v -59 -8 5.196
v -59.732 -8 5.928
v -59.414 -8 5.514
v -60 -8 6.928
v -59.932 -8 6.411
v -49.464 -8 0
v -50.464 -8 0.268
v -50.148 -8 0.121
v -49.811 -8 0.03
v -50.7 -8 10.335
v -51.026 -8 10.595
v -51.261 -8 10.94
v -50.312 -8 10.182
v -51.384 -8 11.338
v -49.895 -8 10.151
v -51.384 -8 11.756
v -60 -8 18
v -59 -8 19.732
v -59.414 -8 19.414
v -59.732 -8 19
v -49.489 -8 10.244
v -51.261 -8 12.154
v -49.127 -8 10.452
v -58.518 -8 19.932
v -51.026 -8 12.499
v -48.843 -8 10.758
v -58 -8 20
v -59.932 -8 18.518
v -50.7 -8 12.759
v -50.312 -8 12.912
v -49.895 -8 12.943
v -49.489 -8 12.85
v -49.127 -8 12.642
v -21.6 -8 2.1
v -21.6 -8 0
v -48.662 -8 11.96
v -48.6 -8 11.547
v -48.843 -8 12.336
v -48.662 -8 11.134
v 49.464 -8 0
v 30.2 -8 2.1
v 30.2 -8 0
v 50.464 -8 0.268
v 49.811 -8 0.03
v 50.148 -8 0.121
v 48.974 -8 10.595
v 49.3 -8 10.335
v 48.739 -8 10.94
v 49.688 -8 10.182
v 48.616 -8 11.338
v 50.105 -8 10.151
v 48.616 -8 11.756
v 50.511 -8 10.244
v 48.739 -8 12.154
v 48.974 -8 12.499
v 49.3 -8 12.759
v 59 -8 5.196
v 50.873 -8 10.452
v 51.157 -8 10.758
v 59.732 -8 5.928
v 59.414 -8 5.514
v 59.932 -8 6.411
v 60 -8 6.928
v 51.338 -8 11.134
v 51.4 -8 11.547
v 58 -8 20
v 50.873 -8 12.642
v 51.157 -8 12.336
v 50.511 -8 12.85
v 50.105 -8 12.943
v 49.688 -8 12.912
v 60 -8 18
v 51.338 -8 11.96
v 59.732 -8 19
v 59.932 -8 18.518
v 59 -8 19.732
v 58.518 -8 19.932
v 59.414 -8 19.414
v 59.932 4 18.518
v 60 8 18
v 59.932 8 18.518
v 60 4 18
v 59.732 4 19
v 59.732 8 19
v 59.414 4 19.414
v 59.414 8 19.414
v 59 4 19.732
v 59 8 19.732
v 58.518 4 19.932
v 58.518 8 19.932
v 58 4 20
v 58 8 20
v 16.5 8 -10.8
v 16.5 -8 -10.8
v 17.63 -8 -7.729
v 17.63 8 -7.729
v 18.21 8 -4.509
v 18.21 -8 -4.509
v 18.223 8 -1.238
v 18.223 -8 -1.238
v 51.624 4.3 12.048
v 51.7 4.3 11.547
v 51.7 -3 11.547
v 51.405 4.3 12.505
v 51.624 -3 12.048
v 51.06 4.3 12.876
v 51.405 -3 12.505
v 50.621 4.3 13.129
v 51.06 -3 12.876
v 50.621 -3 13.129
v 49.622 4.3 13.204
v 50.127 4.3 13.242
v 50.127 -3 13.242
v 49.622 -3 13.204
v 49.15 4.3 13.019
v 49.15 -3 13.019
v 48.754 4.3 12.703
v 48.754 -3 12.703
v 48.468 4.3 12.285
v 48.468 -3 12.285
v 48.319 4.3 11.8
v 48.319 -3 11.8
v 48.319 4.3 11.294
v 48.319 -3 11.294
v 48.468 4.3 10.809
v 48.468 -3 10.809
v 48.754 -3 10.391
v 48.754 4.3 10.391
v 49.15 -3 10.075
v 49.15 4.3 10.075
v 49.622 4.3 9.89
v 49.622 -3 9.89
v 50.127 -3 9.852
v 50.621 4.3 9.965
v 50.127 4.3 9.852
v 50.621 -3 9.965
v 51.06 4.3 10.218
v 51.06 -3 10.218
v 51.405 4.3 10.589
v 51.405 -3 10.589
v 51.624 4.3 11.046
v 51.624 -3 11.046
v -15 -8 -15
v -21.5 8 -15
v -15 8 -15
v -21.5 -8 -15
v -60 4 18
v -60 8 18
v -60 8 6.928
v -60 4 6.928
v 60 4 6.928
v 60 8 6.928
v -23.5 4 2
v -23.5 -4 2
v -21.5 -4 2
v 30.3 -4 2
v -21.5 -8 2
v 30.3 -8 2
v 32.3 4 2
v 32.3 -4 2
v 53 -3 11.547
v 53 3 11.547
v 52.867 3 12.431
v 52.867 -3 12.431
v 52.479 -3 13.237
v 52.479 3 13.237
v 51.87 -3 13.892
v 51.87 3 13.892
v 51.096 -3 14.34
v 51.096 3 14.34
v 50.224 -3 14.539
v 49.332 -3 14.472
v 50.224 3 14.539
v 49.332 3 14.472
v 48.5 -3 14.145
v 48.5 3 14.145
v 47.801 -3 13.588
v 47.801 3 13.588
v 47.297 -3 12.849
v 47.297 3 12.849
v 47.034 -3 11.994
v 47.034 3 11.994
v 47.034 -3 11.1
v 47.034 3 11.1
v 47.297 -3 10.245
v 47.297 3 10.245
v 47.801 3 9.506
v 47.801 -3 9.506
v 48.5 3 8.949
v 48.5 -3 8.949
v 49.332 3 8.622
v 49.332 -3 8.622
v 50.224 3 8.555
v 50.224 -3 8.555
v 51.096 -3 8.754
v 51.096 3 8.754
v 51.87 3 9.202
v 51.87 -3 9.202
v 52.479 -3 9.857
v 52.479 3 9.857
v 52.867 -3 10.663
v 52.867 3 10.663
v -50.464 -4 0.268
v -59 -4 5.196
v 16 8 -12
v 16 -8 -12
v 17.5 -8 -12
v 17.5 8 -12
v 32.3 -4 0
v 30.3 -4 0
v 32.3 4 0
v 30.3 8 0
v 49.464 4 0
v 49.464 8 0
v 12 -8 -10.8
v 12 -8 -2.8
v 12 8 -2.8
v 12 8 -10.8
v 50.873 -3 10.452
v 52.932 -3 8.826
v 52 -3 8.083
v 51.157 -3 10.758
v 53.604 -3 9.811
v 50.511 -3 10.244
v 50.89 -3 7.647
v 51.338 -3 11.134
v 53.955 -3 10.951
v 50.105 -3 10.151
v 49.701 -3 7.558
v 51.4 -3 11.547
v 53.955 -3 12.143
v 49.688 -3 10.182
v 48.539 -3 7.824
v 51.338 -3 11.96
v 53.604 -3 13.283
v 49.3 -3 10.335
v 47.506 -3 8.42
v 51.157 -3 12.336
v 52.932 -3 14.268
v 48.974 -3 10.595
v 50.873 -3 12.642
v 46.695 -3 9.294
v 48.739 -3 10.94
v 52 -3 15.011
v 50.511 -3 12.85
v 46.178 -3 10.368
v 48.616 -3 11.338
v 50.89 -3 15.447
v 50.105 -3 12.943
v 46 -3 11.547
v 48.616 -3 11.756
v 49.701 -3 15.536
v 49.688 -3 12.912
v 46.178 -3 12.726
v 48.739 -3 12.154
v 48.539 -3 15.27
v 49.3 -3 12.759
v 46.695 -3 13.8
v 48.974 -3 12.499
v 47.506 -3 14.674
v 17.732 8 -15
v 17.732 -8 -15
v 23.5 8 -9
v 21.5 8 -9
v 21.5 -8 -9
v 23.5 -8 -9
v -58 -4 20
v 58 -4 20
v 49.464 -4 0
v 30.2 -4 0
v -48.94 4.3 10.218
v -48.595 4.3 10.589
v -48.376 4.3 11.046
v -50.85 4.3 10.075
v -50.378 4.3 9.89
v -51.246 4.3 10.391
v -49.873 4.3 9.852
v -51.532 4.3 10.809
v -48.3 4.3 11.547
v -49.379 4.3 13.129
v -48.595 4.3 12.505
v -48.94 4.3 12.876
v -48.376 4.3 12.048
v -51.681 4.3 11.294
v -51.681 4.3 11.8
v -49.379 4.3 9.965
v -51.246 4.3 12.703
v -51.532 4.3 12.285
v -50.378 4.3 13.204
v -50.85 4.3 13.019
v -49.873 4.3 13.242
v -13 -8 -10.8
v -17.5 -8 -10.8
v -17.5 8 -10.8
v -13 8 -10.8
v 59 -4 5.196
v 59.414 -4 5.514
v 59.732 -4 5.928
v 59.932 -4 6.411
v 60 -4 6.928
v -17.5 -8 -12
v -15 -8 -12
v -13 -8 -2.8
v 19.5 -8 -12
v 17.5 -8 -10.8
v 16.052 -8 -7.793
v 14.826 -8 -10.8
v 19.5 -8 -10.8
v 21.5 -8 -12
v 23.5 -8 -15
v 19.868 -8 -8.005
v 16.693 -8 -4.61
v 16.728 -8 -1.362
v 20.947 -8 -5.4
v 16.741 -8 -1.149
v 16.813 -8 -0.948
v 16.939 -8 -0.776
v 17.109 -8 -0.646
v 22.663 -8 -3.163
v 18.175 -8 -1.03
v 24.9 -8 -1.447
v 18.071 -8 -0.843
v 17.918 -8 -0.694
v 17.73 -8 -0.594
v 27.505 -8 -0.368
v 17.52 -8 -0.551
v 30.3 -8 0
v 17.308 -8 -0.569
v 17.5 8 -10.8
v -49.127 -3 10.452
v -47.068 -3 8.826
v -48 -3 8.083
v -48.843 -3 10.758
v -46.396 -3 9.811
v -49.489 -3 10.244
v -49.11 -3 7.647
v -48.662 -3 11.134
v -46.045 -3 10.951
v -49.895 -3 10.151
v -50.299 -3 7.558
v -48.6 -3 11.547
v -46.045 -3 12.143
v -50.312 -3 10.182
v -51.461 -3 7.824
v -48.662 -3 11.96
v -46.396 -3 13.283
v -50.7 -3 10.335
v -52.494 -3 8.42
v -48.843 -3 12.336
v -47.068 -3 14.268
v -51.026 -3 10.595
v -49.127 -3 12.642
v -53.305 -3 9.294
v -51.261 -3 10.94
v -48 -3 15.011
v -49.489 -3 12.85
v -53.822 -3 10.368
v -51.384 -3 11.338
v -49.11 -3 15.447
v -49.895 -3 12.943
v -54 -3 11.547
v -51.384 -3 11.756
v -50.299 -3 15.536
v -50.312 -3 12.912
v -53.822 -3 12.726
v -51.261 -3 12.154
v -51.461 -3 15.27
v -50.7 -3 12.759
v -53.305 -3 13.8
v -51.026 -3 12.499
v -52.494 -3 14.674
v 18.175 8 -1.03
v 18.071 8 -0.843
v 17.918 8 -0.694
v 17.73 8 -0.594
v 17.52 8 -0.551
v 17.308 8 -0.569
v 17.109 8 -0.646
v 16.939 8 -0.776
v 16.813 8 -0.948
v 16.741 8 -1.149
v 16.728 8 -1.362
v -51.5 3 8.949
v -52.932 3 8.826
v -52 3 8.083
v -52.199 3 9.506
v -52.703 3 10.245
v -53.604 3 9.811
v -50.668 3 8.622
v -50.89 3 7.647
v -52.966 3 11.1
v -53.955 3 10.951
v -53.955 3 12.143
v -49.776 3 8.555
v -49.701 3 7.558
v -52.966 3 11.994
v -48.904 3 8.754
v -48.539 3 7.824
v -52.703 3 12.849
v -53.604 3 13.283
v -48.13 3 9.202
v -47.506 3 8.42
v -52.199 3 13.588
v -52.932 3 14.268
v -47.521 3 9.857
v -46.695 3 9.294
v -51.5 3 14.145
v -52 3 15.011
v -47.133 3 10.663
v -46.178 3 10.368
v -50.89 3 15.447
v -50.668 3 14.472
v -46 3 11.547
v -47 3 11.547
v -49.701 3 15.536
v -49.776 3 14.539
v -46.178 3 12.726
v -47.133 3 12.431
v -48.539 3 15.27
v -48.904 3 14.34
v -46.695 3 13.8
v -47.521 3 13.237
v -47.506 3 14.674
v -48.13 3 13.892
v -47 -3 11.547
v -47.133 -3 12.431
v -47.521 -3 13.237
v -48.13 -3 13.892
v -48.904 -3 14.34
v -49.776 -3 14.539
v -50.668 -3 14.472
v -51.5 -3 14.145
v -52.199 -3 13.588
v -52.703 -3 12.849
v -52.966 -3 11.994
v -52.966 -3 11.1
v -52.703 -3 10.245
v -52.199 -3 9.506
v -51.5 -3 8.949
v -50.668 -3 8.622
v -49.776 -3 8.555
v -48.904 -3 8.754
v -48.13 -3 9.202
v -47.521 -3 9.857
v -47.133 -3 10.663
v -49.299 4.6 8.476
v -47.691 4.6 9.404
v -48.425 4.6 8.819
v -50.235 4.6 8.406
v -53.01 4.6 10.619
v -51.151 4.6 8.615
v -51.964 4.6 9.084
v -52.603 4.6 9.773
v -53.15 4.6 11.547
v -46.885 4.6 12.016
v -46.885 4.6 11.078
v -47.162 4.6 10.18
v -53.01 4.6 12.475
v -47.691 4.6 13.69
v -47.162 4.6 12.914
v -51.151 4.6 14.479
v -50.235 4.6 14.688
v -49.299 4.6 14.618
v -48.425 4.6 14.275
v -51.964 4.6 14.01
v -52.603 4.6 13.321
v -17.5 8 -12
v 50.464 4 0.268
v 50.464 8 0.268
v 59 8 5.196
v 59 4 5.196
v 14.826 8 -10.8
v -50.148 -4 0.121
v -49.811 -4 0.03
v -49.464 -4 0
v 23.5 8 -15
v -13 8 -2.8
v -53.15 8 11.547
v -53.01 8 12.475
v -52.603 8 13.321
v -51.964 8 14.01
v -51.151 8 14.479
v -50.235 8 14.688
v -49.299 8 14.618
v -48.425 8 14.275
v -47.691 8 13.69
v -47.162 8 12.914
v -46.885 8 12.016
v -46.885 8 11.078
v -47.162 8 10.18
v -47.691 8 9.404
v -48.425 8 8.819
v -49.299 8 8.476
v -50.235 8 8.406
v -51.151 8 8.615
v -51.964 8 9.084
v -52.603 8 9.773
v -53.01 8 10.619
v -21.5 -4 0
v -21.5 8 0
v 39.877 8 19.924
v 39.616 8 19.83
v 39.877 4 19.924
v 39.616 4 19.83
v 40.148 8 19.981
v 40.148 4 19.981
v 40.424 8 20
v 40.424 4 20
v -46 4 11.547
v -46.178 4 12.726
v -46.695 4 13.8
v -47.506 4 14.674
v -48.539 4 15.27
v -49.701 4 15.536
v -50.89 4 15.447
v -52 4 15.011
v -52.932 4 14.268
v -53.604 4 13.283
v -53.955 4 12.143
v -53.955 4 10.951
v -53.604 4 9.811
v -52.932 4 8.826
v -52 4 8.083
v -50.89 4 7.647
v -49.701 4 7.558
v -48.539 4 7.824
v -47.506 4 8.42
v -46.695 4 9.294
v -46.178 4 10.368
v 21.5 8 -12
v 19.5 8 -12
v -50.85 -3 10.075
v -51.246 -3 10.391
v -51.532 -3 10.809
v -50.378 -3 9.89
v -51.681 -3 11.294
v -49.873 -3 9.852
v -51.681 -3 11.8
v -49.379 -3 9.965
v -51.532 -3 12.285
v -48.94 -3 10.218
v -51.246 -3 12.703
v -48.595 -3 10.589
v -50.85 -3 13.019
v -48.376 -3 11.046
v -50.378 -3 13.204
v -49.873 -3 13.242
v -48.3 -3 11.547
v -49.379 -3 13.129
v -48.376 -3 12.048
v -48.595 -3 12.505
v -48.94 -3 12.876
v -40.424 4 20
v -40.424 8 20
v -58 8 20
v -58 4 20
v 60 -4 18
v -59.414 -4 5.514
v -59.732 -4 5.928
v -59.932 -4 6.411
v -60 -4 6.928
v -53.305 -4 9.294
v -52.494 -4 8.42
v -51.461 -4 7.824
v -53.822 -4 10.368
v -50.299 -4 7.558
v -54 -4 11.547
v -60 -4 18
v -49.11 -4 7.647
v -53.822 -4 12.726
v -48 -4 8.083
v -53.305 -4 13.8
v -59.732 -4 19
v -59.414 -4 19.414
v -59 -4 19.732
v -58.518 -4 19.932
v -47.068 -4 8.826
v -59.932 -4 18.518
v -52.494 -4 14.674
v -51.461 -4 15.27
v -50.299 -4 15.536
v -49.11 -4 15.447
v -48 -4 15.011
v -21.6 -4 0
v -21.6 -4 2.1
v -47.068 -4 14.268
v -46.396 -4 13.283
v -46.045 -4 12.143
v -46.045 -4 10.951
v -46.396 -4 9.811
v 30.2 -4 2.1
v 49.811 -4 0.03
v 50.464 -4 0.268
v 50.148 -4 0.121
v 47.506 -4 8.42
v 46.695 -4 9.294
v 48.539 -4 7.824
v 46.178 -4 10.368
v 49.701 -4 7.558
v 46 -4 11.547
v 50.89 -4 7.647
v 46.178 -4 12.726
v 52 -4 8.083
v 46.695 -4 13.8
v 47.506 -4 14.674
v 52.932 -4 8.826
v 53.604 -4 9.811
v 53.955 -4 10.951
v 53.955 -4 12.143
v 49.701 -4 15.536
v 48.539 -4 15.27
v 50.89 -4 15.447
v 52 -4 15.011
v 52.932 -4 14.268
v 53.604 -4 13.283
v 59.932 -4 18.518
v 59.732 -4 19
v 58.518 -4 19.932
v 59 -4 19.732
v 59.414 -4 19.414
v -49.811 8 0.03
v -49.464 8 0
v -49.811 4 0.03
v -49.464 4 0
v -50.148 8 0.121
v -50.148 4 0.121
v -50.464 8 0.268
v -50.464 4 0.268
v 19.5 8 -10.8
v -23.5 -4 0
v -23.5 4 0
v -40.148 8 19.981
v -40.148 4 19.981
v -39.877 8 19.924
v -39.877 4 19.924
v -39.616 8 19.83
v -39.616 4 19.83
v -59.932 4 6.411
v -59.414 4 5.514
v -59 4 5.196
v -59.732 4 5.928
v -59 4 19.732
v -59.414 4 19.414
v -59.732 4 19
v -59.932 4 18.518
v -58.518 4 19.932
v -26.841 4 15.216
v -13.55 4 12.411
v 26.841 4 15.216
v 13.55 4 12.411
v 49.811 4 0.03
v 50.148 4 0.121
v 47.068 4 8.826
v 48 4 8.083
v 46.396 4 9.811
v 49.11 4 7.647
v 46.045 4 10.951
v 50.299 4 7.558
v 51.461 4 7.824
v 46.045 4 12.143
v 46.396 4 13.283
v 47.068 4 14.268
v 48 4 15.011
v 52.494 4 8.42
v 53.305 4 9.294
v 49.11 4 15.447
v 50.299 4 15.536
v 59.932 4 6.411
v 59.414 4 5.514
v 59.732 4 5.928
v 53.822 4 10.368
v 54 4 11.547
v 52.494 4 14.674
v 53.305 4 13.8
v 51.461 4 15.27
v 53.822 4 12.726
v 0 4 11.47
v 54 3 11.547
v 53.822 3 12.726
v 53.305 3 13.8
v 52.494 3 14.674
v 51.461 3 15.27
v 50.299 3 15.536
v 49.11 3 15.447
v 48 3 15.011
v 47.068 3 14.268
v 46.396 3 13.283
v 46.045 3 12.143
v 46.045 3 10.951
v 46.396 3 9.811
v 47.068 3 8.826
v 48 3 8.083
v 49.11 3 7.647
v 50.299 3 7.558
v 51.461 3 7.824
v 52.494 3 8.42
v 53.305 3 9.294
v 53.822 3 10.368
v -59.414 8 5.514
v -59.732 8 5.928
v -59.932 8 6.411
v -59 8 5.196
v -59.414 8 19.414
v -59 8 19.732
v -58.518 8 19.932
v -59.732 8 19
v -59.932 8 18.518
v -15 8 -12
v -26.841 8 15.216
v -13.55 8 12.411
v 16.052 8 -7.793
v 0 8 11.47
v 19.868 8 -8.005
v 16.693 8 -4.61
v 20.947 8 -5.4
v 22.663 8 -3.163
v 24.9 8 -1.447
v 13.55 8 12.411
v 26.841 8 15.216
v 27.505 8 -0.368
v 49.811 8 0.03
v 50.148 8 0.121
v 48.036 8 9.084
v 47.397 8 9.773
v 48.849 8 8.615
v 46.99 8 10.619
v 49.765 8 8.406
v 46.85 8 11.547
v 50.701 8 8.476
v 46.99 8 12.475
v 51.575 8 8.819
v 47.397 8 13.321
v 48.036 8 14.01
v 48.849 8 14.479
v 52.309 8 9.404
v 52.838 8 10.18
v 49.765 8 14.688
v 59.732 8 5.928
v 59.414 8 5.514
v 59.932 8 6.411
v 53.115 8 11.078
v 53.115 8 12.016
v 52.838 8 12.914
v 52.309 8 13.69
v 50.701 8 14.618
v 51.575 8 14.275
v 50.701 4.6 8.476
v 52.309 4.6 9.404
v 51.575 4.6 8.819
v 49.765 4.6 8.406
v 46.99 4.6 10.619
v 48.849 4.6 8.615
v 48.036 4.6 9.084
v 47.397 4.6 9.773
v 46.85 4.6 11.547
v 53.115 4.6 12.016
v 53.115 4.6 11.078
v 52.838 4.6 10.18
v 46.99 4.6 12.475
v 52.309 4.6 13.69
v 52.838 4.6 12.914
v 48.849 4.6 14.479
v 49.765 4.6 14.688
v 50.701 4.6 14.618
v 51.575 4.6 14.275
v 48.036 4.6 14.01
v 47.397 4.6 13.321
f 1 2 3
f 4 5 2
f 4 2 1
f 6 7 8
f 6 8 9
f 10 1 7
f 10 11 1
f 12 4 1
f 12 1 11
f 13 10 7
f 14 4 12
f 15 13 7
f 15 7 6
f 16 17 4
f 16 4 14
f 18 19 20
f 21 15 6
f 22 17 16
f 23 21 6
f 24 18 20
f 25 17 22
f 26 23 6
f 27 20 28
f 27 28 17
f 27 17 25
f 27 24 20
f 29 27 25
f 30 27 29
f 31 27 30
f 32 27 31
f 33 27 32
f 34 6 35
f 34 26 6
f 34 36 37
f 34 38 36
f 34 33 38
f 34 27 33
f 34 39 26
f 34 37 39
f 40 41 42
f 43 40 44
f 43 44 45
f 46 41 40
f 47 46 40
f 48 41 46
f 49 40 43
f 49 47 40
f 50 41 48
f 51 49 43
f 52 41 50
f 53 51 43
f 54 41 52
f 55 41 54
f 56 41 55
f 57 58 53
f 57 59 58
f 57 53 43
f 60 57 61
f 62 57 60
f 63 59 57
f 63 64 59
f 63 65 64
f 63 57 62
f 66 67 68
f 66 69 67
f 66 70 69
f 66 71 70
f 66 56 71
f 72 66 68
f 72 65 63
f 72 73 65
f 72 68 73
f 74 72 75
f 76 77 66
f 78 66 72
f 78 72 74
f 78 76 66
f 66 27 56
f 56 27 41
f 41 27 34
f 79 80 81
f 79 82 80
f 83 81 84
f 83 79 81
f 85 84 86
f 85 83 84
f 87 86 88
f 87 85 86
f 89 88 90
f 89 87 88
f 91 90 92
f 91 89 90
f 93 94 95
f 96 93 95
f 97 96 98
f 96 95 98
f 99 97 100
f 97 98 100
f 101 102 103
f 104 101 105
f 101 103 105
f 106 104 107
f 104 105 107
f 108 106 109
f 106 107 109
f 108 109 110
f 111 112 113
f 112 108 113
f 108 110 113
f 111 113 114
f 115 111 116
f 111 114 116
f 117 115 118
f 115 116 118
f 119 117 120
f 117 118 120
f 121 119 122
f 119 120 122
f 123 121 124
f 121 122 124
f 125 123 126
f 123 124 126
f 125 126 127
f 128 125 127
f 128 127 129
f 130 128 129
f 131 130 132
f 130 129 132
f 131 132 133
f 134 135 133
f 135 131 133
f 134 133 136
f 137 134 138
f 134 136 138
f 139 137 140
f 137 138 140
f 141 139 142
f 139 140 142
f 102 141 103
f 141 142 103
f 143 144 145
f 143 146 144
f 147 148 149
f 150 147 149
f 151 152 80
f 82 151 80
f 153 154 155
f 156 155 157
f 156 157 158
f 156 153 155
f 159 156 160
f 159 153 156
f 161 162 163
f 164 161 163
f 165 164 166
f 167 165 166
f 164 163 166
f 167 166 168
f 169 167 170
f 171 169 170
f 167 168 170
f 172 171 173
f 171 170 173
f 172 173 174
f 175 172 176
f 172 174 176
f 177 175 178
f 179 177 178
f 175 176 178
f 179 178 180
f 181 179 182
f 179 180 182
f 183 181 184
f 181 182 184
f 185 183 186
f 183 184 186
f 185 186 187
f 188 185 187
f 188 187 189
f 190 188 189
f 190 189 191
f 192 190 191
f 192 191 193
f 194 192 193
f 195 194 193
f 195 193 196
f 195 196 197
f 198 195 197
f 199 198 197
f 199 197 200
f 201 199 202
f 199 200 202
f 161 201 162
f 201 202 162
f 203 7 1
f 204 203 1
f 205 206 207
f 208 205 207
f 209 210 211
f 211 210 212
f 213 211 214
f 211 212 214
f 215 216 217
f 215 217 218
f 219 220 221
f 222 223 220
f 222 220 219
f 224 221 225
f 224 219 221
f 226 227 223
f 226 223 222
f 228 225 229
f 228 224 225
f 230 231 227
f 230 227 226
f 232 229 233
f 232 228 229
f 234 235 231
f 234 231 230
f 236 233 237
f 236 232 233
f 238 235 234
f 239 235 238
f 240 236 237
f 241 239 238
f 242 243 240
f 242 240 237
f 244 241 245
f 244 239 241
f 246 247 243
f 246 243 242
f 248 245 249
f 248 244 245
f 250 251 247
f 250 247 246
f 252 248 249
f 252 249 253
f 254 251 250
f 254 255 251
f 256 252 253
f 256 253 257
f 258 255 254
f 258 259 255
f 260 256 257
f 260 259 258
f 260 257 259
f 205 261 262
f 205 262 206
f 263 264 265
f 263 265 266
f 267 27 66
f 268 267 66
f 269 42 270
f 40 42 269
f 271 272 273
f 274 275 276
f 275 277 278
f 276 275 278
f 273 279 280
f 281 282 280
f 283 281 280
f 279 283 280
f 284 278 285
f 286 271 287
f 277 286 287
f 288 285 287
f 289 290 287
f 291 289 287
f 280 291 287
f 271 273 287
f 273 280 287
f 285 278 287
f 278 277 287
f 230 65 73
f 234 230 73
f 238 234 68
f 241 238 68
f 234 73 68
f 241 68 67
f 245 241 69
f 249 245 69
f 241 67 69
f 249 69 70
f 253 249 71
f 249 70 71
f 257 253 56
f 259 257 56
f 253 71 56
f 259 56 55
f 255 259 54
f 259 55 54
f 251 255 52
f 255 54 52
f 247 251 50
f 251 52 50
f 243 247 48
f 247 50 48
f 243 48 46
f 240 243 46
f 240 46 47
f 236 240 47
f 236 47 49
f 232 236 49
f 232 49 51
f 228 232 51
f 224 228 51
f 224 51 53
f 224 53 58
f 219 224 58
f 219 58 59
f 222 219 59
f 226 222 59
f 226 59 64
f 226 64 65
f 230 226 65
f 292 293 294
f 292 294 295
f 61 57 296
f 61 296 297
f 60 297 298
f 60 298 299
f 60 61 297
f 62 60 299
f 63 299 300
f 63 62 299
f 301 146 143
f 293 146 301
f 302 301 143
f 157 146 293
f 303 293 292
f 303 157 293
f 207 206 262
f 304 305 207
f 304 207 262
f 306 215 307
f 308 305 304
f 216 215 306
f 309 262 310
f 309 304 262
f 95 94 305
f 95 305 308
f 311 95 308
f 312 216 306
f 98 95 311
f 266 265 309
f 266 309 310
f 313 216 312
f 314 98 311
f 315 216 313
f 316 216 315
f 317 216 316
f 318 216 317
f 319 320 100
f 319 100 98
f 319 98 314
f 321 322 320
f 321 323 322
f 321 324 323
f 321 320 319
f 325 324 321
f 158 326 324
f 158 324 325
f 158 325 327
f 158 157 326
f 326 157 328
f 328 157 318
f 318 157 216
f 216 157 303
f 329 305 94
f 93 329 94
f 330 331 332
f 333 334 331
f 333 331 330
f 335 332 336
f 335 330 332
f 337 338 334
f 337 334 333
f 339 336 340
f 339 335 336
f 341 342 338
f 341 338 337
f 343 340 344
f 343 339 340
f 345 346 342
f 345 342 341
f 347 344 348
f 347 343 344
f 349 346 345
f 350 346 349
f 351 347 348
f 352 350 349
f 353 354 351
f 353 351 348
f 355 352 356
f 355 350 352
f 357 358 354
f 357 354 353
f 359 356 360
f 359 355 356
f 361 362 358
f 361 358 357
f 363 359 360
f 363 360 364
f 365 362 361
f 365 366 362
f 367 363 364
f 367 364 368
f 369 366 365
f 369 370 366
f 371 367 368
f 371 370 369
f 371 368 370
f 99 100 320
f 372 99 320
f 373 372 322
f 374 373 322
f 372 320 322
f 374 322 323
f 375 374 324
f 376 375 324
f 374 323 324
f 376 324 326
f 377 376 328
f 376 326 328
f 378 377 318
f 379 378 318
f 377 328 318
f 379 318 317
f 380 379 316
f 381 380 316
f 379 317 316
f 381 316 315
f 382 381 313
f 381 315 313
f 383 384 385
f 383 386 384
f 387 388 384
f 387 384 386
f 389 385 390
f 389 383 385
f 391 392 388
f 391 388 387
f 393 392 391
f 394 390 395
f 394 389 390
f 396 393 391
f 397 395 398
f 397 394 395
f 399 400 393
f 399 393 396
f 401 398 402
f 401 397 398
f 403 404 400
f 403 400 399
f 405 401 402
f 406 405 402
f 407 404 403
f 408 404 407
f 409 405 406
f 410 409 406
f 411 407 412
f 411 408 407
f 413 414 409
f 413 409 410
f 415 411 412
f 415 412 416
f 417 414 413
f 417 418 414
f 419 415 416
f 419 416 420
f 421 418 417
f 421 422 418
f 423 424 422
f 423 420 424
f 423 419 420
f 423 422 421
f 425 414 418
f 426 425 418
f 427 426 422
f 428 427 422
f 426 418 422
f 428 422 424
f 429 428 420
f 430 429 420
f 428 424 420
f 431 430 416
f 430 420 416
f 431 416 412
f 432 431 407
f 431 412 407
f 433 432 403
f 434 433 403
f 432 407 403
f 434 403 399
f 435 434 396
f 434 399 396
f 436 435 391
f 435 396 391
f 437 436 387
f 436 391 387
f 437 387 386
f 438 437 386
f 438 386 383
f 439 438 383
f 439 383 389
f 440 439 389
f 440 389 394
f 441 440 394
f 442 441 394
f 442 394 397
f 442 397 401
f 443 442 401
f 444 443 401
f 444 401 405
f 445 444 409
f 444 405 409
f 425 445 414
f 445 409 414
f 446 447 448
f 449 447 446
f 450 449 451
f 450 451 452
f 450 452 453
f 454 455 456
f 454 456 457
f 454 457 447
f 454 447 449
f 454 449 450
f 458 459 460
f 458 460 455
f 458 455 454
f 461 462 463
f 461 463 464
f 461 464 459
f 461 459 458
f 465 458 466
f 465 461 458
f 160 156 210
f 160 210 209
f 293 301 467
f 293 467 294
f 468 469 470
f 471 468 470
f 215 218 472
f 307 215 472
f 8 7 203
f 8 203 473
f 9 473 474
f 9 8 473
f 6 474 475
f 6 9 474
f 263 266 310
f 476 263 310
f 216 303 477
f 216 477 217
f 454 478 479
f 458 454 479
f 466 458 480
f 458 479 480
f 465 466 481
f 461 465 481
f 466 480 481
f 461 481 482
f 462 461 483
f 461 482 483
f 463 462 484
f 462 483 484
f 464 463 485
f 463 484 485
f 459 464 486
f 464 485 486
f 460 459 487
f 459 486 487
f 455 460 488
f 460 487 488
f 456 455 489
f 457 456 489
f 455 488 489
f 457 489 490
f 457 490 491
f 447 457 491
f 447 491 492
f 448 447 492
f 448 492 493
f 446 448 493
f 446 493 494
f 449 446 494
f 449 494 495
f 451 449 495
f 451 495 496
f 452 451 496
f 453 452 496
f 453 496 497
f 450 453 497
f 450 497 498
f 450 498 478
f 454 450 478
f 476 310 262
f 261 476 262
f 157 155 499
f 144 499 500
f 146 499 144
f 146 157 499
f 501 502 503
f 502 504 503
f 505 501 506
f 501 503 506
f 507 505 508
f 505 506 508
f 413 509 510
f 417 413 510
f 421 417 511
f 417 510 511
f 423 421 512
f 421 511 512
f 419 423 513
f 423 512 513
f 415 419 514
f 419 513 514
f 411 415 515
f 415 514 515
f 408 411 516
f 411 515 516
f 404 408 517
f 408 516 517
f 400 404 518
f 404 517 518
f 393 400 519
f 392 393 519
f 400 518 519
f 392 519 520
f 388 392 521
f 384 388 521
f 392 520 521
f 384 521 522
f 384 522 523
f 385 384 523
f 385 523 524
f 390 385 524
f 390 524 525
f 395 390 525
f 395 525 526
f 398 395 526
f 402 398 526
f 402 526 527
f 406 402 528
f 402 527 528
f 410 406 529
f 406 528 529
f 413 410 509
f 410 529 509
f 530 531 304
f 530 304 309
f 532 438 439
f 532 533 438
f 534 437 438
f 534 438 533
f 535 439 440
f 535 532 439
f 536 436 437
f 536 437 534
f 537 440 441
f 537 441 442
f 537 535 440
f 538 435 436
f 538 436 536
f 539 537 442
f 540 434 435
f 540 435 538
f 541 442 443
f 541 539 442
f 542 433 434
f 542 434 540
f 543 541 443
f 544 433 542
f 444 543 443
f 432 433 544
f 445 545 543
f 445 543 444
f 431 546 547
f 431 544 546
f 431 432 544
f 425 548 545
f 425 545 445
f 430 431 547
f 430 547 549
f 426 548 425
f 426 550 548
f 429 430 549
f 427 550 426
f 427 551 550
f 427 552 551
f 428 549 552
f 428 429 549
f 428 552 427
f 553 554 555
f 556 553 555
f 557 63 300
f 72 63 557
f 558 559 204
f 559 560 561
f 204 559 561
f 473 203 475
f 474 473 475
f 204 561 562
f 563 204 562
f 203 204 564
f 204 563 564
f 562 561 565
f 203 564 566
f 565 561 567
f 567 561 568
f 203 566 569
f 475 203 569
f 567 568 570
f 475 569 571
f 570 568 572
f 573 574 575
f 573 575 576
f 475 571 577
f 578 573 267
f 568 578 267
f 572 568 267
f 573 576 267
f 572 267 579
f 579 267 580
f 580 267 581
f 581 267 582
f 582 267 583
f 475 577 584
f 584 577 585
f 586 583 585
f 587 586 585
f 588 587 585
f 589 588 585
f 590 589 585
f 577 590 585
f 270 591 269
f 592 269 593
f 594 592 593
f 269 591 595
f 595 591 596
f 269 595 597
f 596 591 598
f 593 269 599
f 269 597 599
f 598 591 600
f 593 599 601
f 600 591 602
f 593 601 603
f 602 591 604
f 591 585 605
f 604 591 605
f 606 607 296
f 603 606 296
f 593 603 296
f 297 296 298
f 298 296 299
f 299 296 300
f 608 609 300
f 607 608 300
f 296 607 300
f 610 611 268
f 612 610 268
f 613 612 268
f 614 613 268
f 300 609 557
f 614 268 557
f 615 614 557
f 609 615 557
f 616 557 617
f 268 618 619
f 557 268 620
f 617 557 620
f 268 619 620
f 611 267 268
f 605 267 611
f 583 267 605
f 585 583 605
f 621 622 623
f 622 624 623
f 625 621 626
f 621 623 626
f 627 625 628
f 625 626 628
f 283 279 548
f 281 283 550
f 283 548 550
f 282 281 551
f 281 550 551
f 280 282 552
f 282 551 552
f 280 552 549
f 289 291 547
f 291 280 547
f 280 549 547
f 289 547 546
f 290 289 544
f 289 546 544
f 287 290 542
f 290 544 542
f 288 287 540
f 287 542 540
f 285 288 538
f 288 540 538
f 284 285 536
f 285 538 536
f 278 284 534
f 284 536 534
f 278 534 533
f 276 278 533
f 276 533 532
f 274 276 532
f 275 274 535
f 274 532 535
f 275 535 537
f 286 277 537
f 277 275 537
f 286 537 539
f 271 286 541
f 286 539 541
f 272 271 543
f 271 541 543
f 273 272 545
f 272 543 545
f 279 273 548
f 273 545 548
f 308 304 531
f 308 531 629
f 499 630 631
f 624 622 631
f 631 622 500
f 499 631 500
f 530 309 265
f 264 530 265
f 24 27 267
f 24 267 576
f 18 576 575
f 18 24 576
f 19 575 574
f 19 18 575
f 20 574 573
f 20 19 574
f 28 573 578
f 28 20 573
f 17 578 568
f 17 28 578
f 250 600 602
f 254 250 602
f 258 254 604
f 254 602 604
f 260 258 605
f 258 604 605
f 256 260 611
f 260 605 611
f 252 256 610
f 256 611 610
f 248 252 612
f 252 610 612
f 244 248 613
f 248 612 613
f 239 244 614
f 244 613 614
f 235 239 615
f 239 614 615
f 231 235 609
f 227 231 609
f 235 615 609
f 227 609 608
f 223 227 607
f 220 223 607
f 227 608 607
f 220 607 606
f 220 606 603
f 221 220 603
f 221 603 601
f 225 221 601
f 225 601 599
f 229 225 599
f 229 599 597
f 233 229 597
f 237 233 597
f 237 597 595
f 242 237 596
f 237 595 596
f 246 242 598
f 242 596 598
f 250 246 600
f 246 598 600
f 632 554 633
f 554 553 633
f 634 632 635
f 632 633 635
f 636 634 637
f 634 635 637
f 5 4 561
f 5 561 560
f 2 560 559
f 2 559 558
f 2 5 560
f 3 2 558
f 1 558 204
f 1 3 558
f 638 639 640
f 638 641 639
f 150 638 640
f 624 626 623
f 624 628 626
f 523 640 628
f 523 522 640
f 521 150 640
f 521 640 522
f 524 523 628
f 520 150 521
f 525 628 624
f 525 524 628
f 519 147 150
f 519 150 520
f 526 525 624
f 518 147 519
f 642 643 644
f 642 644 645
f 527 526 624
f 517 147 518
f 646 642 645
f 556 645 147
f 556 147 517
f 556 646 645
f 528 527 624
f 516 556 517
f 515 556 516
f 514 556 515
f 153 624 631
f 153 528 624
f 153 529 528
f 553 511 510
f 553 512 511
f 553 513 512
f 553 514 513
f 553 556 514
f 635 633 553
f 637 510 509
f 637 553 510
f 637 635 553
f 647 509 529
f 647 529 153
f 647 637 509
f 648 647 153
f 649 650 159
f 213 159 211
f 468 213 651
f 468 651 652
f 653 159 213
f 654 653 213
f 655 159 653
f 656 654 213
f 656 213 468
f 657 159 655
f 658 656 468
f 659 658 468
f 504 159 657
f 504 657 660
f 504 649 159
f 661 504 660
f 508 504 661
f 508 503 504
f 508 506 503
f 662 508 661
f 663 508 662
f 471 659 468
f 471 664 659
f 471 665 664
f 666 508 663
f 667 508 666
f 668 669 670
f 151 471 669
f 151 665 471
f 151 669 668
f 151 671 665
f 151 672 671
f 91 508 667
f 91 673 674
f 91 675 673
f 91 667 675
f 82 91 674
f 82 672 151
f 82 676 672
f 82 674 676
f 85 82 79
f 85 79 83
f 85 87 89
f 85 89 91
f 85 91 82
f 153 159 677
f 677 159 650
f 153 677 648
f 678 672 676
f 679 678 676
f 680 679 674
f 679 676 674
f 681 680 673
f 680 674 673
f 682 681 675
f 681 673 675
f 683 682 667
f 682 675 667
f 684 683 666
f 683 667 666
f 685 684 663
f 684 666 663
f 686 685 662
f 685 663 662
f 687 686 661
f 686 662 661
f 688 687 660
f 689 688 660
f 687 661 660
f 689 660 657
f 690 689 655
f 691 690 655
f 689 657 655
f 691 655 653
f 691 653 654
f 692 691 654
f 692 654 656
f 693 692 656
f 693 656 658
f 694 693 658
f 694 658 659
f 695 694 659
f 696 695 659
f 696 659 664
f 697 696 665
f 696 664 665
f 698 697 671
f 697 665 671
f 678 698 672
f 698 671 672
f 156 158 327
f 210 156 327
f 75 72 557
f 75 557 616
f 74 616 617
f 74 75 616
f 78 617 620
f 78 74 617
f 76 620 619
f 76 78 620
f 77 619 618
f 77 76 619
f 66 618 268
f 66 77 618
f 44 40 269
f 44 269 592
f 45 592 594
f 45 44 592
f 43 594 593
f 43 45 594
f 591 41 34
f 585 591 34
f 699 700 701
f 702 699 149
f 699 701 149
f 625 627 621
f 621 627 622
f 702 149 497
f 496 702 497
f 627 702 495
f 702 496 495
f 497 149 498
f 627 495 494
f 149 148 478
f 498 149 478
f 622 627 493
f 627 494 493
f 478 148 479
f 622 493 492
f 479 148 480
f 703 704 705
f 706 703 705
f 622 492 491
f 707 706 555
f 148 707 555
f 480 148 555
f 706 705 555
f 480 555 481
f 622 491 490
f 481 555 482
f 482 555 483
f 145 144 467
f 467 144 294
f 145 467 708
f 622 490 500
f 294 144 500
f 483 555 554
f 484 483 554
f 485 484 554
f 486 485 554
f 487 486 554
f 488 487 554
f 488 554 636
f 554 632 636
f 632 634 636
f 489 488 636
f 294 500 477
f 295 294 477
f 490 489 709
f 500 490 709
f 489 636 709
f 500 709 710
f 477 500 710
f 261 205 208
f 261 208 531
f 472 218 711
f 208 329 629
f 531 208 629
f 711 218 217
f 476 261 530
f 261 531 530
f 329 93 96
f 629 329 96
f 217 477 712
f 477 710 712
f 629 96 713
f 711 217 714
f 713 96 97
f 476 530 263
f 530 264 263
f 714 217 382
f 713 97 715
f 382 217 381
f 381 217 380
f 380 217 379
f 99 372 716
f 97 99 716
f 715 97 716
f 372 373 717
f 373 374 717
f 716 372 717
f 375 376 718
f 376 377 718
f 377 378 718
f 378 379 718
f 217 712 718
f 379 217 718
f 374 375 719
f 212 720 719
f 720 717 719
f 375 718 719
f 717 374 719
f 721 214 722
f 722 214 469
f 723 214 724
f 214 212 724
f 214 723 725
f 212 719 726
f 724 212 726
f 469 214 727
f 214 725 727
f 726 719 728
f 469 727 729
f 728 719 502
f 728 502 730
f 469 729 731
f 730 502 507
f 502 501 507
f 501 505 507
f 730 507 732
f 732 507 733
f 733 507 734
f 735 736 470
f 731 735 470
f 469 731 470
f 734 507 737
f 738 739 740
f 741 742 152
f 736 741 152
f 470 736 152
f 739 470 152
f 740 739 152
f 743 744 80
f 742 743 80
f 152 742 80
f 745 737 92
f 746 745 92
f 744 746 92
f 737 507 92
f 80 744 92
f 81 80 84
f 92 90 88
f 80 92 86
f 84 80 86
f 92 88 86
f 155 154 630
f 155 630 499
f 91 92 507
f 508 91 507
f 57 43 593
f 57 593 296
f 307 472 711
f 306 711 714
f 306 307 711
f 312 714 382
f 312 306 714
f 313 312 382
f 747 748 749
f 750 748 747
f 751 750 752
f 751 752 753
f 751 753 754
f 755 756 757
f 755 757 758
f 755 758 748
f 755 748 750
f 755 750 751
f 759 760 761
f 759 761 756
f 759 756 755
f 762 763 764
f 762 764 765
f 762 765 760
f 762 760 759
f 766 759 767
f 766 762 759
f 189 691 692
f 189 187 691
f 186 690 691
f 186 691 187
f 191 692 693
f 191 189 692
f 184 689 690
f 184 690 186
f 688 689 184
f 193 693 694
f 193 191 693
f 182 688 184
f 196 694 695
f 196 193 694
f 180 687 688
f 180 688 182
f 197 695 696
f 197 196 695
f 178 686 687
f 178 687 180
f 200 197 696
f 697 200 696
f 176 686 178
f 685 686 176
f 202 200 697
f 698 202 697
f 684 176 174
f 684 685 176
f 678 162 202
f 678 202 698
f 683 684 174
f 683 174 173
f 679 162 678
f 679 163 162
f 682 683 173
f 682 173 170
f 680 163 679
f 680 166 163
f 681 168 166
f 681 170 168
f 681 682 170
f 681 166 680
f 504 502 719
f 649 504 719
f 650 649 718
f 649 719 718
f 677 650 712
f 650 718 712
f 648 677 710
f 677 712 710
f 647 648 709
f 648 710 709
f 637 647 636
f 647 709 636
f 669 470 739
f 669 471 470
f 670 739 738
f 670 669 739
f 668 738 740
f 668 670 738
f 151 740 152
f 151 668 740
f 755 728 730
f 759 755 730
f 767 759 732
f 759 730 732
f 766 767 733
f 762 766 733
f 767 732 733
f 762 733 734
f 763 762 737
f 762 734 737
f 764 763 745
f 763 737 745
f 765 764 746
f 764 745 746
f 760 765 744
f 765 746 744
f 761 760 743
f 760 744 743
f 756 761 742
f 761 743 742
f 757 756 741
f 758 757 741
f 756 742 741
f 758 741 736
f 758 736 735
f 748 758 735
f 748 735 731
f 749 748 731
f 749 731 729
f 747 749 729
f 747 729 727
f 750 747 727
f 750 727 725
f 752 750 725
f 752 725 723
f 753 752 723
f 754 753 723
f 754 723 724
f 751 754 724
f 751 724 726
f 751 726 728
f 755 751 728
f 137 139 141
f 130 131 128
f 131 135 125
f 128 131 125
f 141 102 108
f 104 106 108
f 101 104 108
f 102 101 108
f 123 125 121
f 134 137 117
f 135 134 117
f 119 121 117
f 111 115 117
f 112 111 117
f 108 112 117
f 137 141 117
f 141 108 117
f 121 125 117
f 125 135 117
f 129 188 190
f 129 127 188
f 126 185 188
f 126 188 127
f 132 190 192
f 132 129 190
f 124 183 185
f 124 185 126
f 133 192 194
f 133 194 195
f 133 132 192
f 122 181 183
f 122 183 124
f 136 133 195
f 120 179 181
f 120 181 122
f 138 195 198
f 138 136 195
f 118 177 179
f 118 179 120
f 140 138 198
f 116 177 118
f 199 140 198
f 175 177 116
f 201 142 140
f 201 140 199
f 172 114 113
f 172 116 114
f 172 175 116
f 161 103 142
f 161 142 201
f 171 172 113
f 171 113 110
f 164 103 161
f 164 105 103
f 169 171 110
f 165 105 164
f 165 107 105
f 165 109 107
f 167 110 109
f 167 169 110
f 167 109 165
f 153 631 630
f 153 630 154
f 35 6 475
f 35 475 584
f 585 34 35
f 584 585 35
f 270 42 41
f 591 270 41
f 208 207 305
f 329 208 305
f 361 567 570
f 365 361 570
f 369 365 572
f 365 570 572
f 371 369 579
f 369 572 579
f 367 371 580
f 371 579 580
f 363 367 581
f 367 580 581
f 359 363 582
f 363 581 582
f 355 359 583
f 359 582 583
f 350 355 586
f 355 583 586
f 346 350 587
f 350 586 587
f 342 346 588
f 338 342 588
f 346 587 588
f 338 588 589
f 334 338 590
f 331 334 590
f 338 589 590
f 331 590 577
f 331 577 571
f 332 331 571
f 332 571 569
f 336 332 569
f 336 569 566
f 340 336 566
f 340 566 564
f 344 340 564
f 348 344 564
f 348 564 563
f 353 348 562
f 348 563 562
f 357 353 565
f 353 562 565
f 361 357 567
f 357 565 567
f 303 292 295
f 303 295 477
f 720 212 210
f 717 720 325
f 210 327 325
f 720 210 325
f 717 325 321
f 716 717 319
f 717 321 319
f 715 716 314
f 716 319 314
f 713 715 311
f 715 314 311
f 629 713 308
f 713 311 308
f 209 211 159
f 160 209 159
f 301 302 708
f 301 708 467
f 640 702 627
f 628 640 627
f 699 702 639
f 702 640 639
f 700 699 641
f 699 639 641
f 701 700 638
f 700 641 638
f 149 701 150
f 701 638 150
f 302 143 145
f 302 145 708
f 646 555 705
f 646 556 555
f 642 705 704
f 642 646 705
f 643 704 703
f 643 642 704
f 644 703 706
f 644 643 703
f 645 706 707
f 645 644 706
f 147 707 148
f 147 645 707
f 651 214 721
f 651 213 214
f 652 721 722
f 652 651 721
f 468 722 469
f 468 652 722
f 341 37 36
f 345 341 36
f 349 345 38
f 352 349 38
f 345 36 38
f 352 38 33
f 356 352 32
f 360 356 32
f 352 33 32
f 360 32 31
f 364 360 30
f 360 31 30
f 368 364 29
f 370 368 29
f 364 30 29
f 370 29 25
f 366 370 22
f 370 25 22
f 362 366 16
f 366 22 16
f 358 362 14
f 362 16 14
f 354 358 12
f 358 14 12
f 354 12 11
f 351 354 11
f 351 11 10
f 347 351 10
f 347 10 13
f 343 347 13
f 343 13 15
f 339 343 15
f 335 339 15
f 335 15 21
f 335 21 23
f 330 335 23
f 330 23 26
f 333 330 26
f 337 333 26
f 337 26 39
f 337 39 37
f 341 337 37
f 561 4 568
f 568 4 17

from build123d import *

# Parameters (mm, degrees)
PAD001_DEPTH     = 4
SKETCH004_R      = 4
PAD002_DEPTH     = 1
FILLET_R         = 2
PAD_DEPTH        = 8
SKETCH007_R      = 3
PAD005_DEPTH     = 6
HOLE_D           = 3.4
HOLE_DEPTH       = 25
HOLE_CBORE_D     = 6.3
HOLE_CBORE_DEPTH = 3.4
SKETCH012_W      = 2
SKETCH012_H      = 2
PAD007_DEPTH     = 8
POCKET_DEPTH     = 16.001
FILLET001_R      = 2
SKETCH014_R      = 1.7
PAD008_DEPTH     = 0.3
PAD003_DEPTH     = 4
SKETCH006_R      = 4
PAD004_DEPTH     = 1
SKETCH010_R      = 1.4
HOLE001_DEPTH    = 5.001


with BuildPart() as base:
    # Sketch (on DatumPlane) → Pad001 (new body)
    with BuildSketch(Plane.XZ.offset(-8)):
        Polygon((-21.5, 0), (-21.5, 2), (30.3, 2), (30.3, 0), (50, 0), (60, 5.773503), (60, 20), (-60, 20), (-60, 5.773503), (-50, 0), align=None)
    extrude(amount=PAD001_DEPTH)

    # Sketch004 (on Face12 of Pad001) → Pad002 (join)
    with BuildSketch(Plane.XZ.offset(-4)):
        with Locations((-50, 11.547005)):
            Circle(SKETCH004_R)
        with Locations((50, 11.547005)):
            Circle(SKETCH004_R)
    extrude(amount=PAD002_DEPTH)

    # Fillet
    fillet_edges = [base.edges().sort_by_distance(p)[0] for p in [
        (-50, 6, 0),
        (-60, 6, 5.773503),
        (-60, 6, 20),
        (60, 6, 20),
        (60, 6, 5.773503),
        (50, 6, 0),
    ]]
    fillet(fillet_edges, radius=FILLET_R)


with BuildPart() as clip_and_base:
    # Sketch003 → Pad (new body, symmetric)
    with BuildSketch(Plane.XZ):
        with BuildLine():
            Line((-21.5, 0), (-21.5, -15))
            Line((-21.5, -15), (-15, -15))
            Line((-15, -15), (-15, -12))
            Line((-15, -12), (-17.5, -12))
            Line((-17.5, -12), (-17.5, -10.8))
            Line((-17.5, -10.8), (-13, -10.8))
            Line((-13, -10.8), (-13, -2.8))
            Line((-13, -2.8), (12, -2.8))
            Line((12, -2.8), (12, -10.8))
            Line((12, -10.8), (14.825962, -10.8))
            ThreePointArc((14.825962, -10.8), (16.447393, -6.216284), (16.728416, -1.362367))
            ThreePointArc((18.223221, -1.237633), (17.413451, -0.552598), (16.728416, -1.362367))
            ThreePointArc((16.5, -10.8), (17.990453, -6.132139), (18.223221, -1.237633))
            Line((17.5, -10.8), (16.5, -10.8))
            Line((17.5, -12), (17.5, -10.8))
            Line((16, -12), (17.5, -12))
            Line((17.732051, -15), (16, -12))
            Line((23.5, -15), (17.732051, -15))
            Line((23.5, -9), (23.5, -15))
            Line((21.5, -9), (23.5, -9))
            Line((21.5, -12), (21.5, -9))
            Line((19.5, -12), (21.5, -12))
            Line((19.5, -12), (19.5, -10.8))
            ThreePointArc((30.3, 0), (22.663246, -3.163247), (19.5, -10.8))
            Line((30.3, 2), (30.3, 0))
            Line((-21.5, 2), (30.3, 2))
            Line((-21.5, 0), (-21.5, 2))
        make_face()
    extrude(amount=PAD_DEPTH, both=True)

    # Boolean: union base
    add(base.part)

    # Sketch007 (on Face44 of Boolean) → Pad005 (join)
    with BuildSketch(Plane.XZ.offset(-3)):
        with Locations((-50, 11.547005)):
            Circle(SKETCH007_R)
        with Locations((50, 11.547005)):
            Circle(SKETCH007_R)
    extrude(amount=PAD005_DEPTH)

    # Hole
    with Locations(Plane(origin=(0, 8, 0), x_dir=(-1, 0, 0), z_dir=(0, 1, 0))):
        with Locations((-50, 11.547005), (50, 11.547005)):
            CounterBoreHole(HOLE_D / 2, HOLE_CBORE_D / 2, HOLE_CBORE_DEPTH, depth=HOLE_DEPTH)

    # Sketch012 (on Face7 of Hole) → Pad007 (join)
    with BuildSketch(Plane.XZ.offset(-4)):
        with Locations((-22.5, 1)):
            Rectangle(SKETCH012_W, SKETCH012_H)
        with Locations((31.3, 1)):
            Rectangle(SKETCH012_W, SKETCH012_H)
    extrude(amount=PAD007_DEPTH)

    # Sketch013 (on Face4 of Pad007) → Pocket (cut, through all)
    with BuildSketch(Plane(origin=(0, 8, 0), x_dir=(-1, 0, 0), z_dir=(0, 1, 0))):
        with BuildLine():
            ThreePointArc((-40, 20), (0, 11.470431), (40, 20))
            Line((-40, 20), (40, 20))
        make_face()
    extrude(amount=-POCKET_DEPTH, mode=Mode.SUBTRACT)

    # Fillet001
    fillet001_edges = [clip_and_base.edges().sort_by_distance(p)[0] for p in [
        (40, 6, 20),
        (-40, 6, 20),
    ]]
    fillet(fillet001_edges, radius=FILLET001_R)

    # Sketch014 (on Face53 of Fillet001) → Pad008 (join)
    with BuildSketch(Plane(origin=(0, 4.6, 0), x_dir=(-1, 0, 0), z_dir=(0, 1, 0))):
        with Locations((-50, 11.547005)):
            Circle(SKETCH014_R)
        with Locations((50, 11.547005)):
            Circle(SKETCH014_R)
    extrude(amount=-PAD008_DEPTH)


with BuildPart() as retainer:
    # Sketch005 (on ShapeBinder) → Pad003 (new body)
    with BuildSketch(Plane.XZ.offset(8)):
        with BuildLine():
            Line((-49.464102, 0), (-21.6, 0))
            Line((-21.6, 2.1), (-21.6, 0))
            Line((30.2, 2.1), (-21.6, 2.1))
            Line((30.2, 0), (30.2, 2.1))
            Line((30.2, 0), (49.464102, 0))
            ThreePointArc((49.464102, 0), (49.98174, 0.068148), (50.464102, 0.267949))
            Line((50.464102, 0.267949), (59, 5.196152))
            ThreePointArc((59, 5.196152), (59.732051, 5.928203), (60, 6.928203))
            Line((60, 6.928203), (60, 18))
            ThreePointArc((60, 18), (59.414214, 19.414214), (58, 20))
            Line((-58, 20), (58, 20))
            ThreePointArc((-58, 20), (-59.414214, 19.414214), (-60, 18))
            Line((-60, 6.928203), (-60, 18))
            ThreePointArc((-60, 6.928203), (-59.732051, 5.928203), (-59, 5.196152))
            Line((-50.464102, 0.267949), (-59, 5.196152))
            ThreePointArc((-50.464102, 0.267949), (-49.98174, 0.068148), (-49.464102, 0))
        make_face()
    extrude(amount=-PAD003_DEPTH)

    # Sketch006 (on Face18 of Pad003) → Pad004 (join)
    with BuildSketch(Plane(origin=(0, -4, 0), x_dir=(-1, 0, 0), z_dir=(0, 1, 0))):
        with Locations((-50, 11.547005)):
            Circle(SKETCH006_R)
        with Locations((50, 11.547005)):
            Circle(SKETCH006_R)
    extrude(amount=PAD004_DEPTH)

    # Sketch010 (on Face4 of Pad004) → Hole001 (cut, through all)
    with BuildSketch(Plane.XZ.offset(8)):
        with Locations((-50, 11.547005)):
            Circle(SKETCH010_R)
        with Locations((50, 11.547005)):
            Circle(SKETCH010_R)
    extrude(amount=-HOLE001_DEPTH, mode=Mode.SUBTRACT)


solid = Compound([clip_and_base.part, retainer.part])
